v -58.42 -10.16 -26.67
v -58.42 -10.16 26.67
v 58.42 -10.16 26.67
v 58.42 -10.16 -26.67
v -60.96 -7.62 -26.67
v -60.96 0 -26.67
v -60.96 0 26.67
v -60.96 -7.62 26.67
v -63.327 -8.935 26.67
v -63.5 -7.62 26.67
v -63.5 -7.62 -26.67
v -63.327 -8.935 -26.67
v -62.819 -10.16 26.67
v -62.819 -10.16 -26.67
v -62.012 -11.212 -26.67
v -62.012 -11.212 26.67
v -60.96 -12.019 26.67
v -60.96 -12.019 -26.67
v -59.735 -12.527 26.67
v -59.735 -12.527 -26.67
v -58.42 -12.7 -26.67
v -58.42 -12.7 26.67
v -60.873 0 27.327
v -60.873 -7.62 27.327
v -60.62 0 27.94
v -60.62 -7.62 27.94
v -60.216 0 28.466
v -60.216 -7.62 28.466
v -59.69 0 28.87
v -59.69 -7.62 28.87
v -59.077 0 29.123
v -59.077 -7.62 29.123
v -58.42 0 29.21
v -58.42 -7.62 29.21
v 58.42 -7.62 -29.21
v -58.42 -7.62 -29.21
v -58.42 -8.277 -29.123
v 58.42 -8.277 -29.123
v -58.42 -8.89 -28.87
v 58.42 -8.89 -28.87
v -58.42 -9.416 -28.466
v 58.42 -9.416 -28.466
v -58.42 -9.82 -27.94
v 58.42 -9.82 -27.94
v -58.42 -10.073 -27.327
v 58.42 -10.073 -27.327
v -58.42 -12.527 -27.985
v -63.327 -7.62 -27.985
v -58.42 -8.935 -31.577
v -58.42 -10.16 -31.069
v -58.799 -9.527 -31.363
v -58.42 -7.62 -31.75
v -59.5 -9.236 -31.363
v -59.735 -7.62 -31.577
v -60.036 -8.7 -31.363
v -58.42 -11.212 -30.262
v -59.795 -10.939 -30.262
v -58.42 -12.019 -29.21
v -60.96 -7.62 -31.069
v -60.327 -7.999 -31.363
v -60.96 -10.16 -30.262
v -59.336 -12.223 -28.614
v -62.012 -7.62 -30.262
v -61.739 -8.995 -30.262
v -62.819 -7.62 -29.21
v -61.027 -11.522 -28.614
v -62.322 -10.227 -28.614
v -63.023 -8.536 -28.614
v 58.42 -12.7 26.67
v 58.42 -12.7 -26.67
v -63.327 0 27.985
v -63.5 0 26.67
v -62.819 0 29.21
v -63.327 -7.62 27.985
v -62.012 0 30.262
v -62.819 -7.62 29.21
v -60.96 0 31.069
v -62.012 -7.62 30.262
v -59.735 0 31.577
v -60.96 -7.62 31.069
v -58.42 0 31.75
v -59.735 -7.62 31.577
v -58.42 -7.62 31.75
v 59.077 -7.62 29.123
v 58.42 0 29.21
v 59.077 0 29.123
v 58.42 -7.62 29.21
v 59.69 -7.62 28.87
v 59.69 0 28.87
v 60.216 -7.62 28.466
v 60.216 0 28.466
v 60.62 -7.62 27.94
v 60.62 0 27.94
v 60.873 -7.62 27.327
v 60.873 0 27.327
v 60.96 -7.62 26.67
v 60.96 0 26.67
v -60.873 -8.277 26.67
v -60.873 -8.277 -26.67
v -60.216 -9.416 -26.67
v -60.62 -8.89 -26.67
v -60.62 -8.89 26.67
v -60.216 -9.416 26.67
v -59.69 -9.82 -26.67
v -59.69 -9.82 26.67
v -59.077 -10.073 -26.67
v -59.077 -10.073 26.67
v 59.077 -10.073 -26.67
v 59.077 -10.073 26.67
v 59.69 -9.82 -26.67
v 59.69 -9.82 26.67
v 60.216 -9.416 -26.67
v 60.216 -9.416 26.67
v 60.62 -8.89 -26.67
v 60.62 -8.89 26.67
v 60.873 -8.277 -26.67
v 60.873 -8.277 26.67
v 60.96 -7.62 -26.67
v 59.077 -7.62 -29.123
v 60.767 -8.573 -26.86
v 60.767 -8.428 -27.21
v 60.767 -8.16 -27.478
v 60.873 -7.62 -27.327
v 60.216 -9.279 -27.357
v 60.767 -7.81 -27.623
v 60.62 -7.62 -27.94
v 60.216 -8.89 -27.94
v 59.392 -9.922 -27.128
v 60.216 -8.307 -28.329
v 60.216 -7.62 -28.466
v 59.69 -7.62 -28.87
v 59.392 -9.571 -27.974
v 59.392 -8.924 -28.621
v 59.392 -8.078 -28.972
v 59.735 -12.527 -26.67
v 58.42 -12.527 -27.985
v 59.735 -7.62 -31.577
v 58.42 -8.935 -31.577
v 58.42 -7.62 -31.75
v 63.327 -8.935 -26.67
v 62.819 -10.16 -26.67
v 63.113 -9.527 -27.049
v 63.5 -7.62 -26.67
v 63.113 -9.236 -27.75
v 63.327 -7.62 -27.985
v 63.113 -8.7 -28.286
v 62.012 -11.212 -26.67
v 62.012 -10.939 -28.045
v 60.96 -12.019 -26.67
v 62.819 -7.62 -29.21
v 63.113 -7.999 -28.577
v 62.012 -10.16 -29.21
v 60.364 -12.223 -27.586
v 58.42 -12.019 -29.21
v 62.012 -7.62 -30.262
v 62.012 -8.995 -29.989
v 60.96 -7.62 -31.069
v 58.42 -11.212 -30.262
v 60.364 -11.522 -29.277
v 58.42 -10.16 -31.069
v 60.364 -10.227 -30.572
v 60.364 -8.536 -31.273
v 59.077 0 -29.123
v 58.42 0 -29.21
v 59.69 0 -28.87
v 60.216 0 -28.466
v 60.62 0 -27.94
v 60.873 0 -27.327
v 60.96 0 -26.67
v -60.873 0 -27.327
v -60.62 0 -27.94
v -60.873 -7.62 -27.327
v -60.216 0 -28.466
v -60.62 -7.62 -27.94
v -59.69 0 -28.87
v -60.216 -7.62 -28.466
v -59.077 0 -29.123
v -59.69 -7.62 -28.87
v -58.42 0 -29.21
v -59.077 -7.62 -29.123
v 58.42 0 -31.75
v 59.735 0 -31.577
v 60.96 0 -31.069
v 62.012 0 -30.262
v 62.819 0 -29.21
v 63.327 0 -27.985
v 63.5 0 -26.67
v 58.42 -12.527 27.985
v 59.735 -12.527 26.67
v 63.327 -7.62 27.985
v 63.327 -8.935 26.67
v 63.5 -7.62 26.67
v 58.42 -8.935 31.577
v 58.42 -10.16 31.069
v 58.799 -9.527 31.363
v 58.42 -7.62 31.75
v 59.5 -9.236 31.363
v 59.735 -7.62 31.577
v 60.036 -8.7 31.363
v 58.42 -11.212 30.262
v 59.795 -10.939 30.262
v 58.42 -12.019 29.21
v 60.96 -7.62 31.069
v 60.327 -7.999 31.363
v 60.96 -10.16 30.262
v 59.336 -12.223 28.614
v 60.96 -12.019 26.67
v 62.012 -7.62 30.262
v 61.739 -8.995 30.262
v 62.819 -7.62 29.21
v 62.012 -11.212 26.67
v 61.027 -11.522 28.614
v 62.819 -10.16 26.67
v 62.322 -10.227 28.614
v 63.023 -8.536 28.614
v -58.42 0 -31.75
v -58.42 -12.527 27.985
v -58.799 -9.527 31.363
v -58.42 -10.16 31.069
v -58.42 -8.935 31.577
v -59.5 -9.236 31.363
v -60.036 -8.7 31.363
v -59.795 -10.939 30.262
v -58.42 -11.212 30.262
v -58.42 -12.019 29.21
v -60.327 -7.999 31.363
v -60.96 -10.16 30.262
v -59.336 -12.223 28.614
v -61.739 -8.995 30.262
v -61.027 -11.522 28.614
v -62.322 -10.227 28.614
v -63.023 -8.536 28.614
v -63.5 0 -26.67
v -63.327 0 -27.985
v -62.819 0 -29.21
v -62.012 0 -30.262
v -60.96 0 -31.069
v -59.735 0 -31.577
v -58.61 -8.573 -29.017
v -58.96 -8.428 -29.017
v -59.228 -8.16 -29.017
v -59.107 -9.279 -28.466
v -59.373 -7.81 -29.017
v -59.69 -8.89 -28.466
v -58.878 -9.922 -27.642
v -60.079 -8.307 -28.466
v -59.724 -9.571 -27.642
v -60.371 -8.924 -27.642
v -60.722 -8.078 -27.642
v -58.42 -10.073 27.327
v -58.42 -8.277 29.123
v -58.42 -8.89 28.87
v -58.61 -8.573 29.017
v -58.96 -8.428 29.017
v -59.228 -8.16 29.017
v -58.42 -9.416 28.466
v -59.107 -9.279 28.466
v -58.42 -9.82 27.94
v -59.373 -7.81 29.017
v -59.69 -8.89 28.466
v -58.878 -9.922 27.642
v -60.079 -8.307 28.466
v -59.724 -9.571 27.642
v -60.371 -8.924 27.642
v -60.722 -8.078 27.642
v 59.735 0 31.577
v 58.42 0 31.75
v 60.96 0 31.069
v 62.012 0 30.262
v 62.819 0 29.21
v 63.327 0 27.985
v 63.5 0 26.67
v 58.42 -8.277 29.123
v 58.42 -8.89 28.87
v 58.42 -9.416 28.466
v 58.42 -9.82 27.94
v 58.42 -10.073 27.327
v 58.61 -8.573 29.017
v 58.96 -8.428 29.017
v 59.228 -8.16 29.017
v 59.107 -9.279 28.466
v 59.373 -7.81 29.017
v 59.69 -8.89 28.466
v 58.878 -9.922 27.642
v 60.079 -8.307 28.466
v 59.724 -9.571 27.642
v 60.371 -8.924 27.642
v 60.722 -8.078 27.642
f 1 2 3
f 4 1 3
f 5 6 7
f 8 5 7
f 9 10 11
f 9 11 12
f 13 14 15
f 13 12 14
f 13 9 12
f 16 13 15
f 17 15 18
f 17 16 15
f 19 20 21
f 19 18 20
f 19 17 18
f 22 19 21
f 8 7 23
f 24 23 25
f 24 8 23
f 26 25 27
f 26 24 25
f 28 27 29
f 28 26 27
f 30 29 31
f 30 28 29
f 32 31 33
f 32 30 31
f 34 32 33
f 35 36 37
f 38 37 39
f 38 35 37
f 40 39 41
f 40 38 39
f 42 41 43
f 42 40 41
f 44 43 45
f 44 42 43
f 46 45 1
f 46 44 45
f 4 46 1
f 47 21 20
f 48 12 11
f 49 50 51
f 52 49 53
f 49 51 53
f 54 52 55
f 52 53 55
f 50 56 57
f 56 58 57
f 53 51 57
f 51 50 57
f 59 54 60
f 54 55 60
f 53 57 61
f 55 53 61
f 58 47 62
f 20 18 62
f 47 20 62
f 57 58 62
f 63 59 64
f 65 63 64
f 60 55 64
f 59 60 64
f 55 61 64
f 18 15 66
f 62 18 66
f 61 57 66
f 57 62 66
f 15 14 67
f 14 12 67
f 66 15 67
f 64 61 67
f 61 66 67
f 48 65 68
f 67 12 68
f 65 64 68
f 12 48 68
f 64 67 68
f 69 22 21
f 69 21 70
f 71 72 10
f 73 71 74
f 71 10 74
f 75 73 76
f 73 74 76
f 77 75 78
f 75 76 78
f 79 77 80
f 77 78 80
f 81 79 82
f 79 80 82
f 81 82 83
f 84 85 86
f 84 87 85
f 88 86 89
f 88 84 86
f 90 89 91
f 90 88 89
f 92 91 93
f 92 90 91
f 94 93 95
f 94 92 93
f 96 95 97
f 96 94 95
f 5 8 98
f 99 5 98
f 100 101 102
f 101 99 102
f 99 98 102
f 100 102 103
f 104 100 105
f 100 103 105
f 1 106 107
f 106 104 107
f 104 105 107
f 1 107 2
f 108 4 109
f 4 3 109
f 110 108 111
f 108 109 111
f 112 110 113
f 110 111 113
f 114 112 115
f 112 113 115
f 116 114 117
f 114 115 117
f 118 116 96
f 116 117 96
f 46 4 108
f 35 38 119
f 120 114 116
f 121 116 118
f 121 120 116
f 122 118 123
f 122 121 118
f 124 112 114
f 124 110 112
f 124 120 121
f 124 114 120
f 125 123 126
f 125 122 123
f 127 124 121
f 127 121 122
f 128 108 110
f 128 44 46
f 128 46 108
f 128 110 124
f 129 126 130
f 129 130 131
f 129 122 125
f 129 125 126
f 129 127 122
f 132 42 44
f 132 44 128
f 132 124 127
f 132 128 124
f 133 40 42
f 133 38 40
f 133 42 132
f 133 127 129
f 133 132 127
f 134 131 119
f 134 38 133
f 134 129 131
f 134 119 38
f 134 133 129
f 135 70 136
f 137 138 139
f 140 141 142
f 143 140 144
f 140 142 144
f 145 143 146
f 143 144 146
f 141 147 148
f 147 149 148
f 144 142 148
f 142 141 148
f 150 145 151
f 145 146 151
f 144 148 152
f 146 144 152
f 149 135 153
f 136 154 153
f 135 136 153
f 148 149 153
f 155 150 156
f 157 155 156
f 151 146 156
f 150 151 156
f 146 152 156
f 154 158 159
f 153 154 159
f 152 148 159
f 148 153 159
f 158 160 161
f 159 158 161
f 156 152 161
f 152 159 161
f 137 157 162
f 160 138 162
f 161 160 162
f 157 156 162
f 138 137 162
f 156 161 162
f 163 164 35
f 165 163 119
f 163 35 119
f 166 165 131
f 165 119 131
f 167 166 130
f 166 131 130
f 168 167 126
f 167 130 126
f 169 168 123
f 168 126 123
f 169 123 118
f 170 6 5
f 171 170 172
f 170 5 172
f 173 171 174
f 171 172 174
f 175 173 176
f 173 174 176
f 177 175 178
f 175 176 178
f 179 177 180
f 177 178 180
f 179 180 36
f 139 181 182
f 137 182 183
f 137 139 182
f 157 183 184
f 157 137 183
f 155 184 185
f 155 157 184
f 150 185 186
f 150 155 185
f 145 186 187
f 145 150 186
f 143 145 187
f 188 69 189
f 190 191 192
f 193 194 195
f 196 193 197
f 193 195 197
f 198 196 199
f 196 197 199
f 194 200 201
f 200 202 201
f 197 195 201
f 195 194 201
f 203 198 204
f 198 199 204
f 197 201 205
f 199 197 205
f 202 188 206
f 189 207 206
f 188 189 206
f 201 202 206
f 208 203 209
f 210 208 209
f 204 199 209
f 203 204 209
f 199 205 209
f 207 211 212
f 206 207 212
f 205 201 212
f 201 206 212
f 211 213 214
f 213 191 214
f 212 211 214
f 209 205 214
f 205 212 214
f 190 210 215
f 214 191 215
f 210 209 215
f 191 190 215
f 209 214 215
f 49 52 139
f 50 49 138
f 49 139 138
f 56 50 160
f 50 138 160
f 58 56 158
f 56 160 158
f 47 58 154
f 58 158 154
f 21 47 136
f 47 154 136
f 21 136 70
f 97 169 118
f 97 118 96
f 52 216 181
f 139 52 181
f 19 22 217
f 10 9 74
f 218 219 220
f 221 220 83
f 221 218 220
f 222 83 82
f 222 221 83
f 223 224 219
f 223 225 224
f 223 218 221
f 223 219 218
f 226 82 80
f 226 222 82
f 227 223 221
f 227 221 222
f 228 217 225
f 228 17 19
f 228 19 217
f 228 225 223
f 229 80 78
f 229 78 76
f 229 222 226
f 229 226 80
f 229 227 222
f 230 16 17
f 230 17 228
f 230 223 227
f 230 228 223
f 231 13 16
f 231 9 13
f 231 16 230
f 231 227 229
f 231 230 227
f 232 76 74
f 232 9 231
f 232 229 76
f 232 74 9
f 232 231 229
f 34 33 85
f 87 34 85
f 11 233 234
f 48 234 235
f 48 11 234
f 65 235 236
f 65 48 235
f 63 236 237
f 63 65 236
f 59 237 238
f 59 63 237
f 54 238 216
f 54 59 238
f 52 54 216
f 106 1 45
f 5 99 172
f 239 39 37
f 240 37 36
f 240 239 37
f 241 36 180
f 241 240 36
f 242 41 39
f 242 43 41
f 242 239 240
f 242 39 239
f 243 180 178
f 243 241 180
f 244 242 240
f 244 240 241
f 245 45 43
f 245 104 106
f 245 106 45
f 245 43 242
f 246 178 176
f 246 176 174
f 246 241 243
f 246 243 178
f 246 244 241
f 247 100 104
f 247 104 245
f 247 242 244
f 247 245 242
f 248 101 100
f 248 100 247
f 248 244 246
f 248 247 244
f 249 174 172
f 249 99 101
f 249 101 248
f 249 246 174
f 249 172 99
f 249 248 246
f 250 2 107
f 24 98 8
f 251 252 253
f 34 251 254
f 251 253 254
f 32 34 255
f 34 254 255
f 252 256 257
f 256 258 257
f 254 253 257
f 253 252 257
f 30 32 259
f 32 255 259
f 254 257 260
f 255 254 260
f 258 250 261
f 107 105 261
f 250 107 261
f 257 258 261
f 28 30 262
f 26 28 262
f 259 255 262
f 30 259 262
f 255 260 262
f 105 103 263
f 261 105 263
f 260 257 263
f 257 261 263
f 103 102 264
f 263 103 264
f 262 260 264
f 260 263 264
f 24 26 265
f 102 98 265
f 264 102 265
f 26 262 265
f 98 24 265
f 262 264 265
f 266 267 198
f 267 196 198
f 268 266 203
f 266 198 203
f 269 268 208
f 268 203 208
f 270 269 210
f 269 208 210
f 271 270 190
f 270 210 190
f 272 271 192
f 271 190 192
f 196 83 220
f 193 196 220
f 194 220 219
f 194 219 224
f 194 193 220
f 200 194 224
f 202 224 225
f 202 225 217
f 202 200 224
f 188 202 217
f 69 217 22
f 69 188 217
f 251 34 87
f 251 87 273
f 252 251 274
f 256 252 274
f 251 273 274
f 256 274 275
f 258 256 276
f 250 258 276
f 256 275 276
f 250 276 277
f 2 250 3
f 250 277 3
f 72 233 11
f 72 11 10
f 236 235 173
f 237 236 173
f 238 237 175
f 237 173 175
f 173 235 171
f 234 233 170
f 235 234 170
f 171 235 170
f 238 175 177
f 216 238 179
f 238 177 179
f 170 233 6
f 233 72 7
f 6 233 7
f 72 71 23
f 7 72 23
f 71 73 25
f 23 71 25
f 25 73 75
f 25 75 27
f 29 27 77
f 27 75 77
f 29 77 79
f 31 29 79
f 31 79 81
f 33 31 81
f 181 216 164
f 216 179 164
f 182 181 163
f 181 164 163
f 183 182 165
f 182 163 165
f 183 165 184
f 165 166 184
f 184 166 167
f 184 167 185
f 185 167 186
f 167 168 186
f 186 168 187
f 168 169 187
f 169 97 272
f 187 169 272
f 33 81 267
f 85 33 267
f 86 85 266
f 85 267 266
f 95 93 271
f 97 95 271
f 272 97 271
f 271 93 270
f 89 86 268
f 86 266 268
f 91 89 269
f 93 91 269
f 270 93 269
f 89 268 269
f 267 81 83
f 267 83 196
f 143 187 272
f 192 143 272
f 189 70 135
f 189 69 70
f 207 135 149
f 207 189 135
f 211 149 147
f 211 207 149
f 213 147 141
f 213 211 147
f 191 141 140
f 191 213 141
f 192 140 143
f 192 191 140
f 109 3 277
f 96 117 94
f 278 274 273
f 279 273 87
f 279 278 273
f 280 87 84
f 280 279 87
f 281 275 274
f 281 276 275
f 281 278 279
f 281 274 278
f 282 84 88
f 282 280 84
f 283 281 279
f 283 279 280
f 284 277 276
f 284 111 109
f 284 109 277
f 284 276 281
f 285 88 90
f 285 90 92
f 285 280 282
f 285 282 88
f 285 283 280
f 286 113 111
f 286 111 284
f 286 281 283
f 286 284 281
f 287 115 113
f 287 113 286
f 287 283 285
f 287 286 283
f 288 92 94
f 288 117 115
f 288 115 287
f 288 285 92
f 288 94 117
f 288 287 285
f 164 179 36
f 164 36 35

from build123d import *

# Parameters (mm, degrees)
F0_W     = 127
F0_H     = 63.5
F1_DEPTH = 12.7
F2_DEPTH = 12.7
F3_R     = 5.08
F4_T     = -2.54


with BuildPart() as f1:
    # F0 (on Front) → F1 (new body)
    with BuildSketch(Plane.XZ):
        Rectangle(F0_W, F0_H)
    extrude(amount=F1_DEPTH)

    # F0 (on Front) → F2 (join)
    with BuildSketch(Plane.XZ):
        Rectangle(F0_W, F0_H)
    extrude(amount=F2_DEPTH)

    # F3
    f3_edges = [f1.edges().sort_by_distance(p)[0] for p in [
        (-63.5, -12.7, 0),
        (0, -12.7, -31.75),
        (63.5, -12.7, 0),
        (0, -12.7, 31.75),
        (63.5, -6.35, 31.75),
        (63.5, -6.35, -31.75),
        (-63.5, -6.35, -31.75),
        (-63.5, -6.35, 31.75),
    ]]
    fillet(f3_edges, radius=F3_R)

    # F4
    f4_openings = [f1.faces().sort_by_distance(p)[0] for p in [
        (0, 0, 0),
    ]]
    offset(amount=F4_T, openings=f4_openings)


solid = f1.part
